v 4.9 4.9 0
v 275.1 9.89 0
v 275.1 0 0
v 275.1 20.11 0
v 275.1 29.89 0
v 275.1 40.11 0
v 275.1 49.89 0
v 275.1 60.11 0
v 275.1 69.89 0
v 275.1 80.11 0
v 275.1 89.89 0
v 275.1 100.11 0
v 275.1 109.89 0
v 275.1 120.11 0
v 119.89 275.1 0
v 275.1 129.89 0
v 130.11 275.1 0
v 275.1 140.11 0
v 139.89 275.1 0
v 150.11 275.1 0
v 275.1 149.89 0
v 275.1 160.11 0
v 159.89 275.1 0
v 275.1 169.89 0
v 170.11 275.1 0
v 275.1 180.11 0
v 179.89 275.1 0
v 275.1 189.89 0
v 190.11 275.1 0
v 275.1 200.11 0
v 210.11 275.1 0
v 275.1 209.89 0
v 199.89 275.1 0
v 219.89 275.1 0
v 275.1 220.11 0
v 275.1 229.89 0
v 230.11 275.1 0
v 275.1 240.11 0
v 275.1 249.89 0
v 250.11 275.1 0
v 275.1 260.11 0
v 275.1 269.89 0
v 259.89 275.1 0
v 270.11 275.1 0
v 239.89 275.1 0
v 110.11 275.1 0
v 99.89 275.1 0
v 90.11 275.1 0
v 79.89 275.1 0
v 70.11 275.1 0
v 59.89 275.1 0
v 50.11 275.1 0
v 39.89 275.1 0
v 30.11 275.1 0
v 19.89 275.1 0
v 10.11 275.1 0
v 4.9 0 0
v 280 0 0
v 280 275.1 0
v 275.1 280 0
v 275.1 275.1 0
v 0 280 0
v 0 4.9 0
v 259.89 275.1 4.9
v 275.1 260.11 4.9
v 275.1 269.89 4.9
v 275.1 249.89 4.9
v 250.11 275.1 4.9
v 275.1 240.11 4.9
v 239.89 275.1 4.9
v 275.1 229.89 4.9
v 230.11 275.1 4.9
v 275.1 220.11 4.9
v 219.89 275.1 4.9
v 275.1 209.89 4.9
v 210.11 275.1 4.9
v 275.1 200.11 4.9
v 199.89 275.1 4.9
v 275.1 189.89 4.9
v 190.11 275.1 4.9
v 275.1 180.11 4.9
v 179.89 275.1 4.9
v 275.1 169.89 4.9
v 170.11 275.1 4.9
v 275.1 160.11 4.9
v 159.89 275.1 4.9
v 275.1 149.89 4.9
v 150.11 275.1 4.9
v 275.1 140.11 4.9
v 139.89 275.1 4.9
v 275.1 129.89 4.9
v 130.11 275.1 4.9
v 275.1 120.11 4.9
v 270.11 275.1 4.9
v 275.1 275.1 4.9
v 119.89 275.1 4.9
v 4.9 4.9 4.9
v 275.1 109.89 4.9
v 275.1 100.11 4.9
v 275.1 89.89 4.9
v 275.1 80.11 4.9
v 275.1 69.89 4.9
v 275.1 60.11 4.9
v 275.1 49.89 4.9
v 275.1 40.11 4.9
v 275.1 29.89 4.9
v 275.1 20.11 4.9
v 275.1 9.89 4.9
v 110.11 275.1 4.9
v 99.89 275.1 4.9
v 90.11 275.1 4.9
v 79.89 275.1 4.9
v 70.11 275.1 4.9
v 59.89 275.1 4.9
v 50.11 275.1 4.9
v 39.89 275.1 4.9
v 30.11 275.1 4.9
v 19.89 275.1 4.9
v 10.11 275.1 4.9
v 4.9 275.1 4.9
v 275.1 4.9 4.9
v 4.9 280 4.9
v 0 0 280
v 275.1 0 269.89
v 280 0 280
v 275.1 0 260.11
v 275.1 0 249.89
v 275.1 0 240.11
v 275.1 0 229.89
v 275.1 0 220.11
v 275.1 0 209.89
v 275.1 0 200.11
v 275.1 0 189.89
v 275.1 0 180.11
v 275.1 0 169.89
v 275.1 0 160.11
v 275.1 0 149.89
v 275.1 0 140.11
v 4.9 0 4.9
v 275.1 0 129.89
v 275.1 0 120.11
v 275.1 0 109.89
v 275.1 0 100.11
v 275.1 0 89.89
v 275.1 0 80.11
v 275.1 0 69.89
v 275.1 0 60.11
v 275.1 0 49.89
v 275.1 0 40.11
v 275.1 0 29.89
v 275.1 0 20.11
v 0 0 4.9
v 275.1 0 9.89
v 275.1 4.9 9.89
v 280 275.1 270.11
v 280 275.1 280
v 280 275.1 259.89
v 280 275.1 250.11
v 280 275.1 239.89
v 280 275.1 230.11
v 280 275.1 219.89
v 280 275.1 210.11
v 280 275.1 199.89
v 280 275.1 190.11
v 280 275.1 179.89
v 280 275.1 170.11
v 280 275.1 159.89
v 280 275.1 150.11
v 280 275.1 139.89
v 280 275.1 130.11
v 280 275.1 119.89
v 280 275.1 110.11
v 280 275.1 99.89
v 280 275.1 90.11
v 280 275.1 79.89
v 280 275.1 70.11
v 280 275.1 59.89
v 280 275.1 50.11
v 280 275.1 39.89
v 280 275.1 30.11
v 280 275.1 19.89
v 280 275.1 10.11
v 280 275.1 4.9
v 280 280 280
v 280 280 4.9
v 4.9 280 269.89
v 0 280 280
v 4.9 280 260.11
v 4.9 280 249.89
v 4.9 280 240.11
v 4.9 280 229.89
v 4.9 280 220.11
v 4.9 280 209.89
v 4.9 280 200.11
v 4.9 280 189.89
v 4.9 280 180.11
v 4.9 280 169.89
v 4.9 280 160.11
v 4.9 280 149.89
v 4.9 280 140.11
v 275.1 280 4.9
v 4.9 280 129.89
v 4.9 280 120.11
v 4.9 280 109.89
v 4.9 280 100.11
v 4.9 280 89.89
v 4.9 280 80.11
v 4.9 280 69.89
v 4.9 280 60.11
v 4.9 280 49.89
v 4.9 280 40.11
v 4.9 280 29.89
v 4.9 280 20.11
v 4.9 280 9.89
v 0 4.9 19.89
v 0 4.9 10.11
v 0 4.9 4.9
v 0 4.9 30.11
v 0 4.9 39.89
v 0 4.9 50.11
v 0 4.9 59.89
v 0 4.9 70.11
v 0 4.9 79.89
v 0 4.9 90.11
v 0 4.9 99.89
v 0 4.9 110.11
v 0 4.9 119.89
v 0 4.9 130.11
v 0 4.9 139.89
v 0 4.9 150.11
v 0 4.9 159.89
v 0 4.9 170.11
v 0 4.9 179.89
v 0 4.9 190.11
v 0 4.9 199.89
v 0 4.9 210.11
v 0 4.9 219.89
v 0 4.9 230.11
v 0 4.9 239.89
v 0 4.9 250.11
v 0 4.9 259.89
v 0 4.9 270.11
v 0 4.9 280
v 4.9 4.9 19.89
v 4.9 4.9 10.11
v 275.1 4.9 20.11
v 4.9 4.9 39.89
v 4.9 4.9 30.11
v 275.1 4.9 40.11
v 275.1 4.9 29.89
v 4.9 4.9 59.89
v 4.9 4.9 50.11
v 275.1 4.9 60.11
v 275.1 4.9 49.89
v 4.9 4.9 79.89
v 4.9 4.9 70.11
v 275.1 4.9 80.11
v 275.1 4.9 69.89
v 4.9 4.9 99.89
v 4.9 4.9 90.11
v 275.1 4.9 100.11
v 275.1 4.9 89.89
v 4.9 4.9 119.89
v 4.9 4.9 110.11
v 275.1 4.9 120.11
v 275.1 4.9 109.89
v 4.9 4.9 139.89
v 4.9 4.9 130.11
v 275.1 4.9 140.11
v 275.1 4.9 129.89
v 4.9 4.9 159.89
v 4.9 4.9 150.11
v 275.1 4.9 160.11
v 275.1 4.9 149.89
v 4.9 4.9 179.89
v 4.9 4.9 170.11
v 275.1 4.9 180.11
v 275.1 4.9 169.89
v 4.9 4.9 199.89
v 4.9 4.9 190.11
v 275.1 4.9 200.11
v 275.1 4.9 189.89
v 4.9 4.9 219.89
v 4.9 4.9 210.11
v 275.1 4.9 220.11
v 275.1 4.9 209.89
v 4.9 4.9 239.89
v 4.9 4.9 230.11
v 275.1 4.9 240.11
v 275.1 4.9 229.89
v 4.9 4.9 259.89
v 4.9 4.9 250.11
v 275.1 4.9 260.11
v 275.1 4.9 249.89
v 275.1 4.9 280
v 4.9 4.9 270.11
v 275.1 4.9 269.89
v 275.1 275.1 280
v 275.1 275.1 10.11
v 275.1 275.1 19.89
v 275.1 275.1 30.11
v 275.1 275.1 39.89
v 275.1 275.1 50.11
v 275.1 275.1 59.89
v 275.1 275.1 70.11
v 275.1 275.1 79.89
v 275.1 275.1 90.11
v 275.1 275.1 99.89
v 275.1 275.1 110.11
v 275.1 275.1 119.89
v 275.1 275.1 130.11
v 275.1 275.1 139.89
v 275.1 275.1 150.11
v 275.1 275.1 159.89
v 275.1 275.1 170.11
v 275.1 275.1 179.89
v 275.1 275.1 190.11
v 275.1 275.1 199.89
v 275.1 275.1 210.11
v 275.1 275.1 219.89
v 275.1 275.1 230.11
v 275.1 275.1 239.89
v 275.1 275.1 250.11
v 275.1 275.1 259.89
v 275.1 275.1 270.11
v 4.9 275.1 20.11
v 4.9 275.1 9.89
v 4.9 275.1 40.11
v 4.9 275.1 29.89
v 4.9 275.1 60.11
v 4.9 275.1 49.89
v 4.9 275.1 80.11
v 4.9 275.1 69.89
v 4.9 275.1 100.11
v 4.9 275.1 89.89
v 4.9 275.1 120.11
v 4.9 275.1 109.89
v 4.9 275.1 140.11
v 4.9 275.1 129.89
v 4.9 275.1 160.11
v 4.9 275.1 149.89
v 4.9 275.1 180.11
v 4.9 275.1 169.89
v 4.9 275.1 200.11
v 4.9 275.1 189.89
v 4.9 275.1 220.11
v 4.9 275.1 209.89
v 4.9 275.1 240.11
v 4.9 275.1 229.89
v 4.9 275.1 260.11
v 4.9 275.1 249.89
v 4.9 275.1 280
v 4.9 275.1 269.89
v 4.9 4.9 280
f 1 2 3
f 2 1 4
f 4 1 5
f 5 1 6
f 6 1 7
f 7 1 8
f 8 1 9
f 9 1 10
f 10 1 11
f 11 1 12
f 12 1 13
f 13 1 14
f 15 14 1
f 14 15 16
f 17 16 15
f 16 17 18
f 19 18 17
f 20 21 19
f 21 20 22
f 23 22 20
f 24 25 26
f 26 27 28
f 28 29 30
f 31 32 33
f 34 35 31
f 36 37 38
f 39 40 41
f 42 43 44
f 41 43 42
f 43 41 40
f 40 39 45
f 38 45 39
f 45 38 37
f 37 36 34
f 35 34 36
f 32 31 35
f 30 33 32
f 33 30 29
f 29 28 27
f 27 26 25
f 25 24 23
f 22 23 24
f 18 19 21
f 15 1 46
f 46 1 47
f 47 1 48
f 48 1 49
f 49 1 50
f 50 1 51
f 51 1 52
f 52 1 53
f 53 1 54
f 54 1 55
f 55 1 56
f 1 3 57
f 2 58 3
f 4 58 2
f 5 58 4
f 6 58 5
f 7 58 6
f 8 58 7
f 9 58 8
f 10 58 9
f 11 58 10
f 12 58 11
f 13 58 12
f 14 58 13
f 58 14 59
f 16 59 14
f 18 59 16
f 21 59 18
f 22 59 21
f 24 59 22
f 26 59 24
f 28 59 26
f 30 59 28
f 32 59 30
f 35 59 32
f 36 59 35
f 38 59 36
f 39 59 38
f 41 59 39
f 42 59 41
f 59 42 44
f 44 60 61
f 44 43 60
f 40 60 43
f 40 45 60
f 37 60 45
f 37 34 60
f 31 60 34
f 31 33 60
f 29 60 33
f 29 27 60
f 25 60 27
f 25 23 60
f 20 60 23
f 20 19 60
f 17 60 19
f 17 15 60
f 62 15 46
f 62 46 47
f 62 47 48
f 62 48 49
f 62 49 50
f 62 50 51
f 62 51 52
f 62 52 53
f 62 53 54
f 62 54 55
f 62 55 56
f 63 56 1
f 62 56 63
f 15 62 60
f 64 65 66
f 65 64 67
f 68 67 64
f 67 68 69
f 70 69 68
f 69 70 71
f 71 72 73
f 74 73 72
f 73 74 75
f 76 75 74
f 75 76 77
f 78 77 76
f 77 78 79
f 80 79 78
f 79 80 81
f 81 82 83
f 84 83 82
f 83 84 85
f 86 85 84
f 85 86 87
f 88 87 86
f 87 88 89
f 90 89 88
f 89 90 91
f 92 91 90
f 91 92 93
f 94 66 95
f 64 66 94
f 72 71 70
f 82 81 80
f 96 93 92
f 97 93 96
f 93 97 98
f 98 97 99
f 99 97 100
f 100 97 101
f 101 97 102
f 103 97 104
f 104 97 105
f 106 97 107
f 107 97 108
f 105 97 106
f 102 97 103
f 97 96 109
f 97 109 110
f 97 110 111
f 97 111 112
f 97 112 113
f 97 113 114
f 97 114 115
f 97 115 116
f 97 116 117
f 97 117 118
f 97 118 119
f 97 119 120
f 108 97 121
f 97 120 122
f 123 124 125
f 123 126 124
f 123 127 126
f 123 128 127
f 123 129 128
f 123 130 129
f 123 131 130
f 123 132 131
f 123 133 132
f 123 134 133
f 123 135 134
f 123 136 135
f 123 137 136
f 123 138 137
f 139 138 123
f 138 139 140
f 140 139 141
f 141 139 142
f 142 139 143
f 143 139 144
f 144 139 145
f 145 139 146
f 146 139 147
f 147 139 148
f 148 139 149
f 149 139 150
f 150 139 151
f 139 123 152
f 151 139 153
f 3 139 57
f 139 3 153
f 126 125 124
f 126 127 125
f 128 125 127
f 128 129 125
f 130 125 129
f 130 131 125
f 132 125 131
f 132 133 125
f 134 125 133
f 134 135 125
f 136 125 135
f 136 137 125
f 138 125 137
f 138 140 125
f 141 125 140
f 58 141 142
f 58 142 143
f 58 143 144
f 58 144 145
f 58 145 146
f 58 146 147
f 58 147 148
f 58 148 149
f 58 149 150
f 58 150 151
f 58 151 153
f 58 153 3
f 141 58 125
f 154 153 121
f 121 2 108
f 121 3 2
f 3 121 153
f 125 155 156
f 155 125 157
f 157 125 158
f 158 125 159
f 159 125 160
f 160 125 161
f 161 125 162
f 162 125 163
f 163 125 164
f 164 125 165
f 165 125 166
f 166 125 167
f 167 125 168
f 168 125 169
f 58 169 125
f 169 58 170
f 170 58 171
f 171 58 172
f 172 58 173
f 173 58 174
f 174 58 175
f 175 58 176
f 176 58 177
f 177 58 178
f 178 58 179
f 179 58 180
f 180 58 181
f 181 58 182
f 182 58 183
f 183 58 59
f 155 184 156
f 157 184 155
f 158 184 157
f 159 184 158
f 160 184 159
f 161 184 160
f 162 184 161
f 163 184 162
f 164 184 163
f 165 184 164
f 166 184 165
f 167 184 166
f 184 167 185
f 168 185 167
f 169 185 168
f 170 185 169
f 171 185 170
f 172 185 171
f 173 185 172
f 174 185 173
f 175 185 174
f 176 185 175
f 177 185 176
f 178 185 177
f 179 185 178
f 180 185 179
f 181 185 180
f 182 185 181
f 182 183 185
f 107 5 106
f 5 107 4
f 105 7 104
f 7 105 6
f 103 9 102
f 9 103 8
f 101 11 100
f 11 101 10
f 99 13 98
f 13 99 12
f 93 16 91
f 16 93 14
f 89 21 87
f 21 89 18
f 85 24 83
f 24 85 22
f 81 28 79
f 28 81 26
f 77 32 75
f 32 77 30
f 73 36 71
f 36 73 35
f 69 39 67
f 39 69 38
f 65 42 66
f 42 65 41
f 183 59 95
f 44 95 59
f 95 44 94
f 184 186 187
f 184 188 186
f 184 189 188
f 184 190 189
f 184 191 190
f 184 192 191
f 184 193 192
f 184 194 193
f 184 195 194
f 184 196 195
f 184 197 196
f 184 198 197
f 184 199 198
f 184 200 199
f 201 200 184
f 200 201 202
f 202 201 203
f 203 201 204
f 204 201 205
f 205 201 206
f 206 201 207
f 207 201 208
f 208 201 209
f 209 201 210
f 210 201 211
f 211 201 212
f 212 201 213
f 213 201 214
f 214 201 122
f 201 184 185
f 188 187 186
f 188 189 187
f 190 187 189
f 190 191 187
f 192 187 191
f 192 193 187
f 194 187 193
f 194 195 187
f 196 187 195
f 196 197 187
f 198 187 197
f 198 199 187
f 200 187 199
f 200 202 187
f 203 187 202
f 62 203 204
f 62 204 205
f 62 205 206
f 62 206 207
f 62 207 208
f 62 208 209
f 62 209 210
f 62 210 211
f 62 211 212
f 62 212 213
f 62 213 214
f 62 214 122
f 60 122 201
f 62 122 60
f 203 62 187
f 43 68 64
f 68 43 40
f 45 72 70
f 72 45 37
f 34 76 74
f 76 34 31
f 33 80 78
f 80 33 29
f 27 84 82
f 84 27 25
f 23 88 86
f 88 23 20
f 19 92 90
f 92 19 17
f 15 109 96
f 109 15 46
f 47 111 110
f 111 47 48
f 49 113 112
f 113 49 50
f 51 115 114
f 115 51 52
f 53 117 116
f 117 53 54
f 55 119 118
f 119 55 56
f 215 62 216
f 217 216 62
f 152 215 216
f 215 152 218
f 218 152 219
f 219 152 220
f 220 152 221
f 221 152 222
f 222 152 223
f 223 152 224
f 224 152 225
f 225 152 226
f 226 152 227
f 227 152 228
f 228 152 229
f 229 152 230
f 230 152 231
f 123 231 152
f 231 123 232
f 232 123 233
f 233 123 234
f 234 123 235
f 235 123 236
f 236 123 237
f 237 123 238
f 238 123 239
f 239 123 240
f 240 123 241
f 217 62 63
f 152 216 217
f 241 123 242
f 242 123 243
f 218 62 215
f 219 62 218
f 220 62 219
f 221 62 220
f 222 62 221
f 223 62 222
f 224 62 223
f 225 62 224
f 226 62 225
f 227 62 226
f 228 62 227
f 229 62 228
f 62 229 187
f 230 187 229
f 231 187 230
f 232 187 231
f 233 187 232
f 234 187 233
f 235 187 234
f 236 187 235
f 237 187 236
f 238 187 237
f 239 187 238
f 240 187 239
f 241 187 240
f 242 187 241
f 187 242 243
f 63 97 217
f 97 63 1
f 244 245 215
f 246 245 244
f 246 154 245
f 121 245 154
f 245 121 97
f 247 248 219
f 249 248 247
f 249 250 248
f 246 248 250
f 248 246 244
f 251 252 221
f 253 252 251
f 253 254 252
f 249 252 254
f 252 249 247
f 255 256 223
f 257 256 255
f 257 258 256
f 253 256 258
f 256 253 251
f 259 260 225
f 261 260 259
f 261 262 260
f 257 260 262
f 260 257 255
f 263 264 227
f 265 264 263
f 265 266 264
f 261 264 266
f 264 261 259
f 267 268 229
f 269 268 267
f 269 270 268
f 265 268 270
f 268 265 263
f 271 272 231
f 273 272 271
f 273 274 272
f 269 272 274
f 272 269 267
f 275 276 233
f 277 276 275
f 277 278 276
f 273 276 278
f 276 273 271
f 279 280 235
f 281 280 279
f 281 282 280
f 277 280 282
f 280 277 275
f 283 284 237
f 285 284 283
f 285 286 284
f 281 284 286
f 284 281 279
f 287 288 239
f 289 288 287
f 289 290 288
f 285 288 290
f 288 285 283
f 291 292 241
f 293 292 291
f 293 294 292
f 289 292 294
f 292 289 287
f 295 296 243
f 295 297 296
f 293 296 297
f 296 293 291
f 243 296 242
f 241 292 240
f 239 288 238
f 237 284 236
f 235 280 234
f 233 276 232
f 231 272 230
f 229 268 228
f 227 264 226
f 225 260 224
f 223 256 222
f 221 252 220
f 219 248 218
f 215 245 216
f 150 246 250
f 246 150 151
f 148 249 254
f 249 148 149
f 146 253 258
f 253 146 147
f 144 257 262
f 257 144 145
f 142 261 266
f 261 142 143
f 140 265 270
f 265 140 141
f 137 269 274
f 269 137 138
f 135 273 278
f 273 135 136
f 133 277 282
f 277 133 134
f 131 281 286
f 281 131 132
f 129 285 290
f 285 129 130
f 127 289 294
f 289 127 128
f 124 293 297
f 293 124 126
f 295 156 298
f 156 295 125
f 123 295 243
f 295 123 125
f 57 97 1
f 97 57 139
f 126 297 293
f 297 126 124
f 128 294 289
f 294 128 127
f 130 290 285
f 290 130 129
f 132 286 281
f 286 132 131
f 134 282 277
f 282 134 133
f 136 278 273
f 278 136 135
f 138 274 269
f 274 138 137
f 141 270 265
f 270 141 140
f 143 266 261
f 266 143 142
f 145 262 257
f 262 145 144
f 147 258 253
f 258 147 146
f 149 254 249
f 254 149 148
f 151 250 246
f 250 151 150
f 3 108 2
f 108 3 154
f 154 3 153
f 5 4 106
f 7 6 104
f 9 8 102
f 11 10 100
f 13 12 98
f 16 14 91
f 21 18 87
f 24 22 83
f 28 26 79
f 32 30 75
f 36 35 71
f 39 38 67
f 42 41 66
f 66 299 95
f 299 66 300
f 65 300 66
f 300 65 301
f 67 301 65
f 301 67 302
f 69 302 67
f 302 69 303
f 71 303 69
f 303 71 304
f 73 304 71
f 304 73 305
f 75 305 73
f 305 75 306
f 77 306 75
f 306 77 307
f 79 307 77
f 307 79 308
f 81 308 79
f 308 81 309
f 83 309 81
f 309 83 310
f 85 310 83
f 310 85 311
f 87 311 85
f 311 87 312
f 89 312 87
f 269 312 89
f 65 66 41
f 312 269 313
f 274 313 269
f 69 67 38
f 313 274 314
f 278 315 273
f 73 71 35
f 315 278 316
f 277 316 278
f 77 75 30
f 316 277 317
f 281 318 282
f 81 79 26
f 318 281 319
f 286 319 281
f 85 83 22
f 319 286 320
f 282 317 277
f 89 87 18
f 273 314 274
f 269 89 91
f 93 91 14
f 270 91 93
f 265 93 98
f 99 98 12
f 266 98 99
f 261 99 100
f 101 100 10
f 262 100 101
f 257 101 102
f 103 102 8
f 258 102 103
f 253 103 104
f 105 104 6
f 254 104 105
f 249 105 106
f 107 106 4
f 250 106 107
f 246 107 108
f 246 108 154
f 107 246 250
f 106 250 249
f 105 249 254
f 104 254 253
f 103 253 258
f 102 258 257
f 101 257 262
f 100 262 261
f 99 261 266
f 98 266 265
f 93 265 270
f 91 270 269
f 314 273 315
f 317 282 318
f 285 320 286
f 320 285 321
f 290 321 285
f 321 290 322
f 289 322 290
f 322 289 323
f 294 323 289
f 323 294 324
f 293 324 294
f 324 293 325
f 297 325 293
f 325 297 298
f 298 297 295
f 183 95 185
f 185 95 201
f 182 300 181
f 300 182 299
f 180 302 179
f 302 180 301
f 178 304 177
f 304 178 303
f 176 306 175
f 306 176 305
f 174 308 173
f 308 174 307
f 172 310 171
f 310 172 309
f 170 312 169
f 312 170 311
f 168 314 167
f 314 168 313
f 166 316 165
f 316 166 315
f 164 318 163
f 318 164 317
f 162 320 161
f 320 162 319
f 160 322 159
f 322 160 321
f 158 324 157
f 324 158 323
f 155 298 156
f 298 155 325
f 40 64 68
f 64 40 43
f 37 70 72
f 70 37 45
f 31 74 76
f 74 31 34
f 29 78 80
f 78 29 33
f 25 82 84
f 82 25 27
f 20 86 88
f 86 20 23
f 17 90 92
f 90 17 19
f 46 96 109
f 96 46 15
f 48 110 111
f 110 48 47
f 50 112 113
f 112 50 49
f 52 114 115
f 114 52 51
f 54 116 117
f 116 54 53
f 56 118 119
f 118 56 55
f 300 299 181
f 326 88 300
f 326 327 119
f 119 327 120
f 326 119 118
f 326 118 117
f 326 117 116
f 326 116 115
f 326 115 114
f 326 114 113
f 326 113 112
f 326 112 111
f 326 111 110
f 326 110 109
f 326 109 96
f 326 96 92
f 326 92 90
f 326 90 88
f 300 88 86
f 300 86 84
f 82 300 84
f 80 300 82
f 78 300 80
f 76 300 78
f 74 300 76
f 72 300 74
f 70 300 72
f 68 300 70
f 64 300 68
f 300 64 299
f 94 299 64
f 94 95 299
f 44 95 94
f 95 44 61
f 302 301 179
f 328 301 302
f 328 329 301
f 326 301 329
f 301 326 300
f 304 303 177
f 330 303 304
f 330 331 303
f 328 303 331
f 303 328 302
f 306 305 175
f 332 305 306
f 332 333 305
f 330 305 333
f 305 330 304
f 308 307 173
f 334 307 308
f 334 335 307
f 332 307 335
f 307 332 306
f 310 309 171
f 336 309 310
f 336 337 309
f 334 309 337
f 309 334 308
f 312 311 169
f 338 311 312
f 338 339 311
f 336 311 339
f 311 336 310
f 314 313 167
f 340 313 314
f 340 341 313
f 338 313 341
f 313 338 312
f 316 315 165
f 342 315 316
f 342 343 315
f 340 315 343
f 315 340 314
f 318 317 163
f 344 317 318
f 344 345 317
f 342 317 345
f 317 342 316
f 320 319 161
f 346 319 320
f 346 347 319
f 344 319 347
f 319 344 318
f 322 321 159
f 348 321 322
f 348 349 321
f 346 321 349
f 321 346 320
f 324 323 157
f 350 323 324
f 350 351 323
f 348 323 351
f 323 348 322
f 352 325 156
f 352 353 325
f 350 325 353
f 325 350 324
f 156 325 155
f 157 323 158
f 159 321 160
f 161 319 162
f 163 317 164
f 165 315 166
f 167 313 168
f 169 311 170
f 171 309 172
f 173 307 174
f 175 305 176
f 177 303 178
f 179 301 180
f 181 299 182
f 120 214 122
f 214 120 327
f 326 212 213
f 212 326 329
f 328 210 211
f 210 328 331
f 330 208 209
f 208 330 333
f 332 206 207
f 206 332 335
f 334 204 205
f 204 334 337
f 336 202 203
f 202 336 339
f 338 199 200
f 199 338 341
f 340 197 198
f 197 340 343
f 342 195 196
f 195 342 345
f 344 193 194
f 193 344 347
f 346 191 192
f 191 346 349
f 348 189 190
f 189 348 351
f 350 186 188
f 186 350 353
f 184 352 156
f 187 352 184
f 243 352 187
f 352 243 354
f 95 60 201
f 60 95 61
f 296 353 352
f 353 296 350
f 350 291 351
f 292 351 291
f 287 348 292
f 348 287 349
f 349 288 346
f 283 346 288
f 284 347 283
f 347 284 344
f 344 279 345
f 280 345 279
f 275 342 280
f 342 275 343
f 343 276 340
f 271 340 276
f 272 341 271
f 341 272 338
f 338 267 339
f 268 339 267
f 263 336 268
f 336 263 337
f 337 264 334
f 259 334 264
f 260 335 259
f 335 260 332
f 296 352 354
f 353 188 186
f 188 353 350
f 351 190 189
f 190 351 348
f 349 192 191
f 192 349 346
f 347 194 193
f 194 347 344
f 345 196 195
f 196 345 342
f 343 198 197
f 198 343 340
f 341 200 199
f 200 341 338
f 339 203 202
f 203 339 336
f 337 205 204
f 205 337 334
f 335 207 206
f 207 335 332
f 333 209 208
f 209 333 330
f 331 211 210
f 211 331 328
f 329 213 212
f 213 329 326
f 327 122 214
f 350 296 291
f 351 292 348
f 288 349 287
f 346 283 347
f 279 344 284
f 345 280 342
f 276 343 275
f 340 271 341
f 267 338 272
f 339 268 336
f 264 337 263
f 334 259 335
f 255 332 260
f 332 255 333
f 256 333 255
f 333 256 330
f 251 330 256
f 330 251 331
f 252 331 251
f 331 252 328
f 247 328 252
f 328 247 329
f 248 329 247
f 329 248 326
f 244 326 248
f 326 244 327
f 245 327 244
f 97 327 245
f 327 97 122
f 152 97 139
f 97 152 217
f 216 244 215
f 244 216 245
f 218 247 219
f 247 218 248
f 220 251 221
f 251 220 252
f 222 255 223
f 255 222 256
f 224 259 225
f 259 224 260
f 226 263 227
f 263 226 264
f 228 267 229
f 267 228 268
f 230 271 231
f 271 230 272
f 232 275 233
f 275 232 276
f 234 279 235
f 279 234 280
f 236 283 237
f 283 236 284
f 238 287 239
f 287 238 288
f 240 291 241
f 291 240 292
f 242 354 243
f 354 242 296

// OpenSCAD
union() {
	union() {
		linear_extrude(height = 4.9000000000) {
			union() {
				difference() {
					polygon(points = [[275.1000000000, 269.8900000000], [275.1000000000, 260.1100000000], [280.0000000000, 260.1100000000], [280.0000000000, 249.8900000000], [275.1000000000, 249.8900000000], [275.1000000000, 240.1100000000], [280.0000000000, 240.1100000000], [280.0000000000, 229.8900000000], [275.1000000000, 229.8900000000], [275.1000000000, 220.1100000000], [280.0000000000, 220.1100000000], [280.0000000000, 209.8900000000], [275.1000000000, 209.8900000000], [275.1000000000, 200.1100000000], [280.0000000000, 200.1100000000], [280.0000000000, 189.8900000000], [275.1000000000, 189.8900000000], [275.1000000000, 180.1100000000], [280.0000000000, 180.1100000000], [280.0000000000, 169.8900000000], [275.1000000000, 169.8900000000], [275.1000000000, 160.1100000000], [280.0000000000, 160.1100000000], [280.0000000000, 149.8900000000], [275.1000000000, 149.8900000000], [275.1000000000, 140.1100000000], [280.0000000000, 140.1100000000], [280.0000000000, 129.8900000000], [275.1000000000, 129.8900000000], [275.1000000000, 120.1100000000], [280.0000000000, 120.1100000000], [280.0000000000, 109.8900000000], [275.1000000000, 109.8900000000], [275.1000000000, 100.1100000000], [280.0000000000, 100.1100000000], [280.0000000000, 89.8900000000], [275.1000000000, 89.8900000000], [275.1000000000, 80.1100000000], [280.0000000000, 80.1100000000], [280.0000000000, 69.8900000000], [275.1000000000, 69.8900000000], [275.1000000000, 60.1100000000], [280.0000000000, 60.1100000000], [280.0000000000, 49.8900000000], [275.1000000000, 49.8900000000], [275.1000000000, 40.1100000000], [280.0000000000, 40.1100000000], [280.0000000000, 29.8900000000], [275.1000000000, 29.8900000000], [275.1000000000, 20.1100000000], [280.0000000000, 20.1100000000], [280.0000000000, 9.8900000000], [275.1000000000, 9.8900000000], [275.1000000000, 0.0000000000], [269.8900000000, 0.0000000000], [269.8900000000, 4.9000000000], [260.1100000000, 4.9000000000], [260.1100000000, 0.0000000000], [249.8900000000, 0.0000000000], [249.8900000000, 4.9000000000], [240.1100000000, 4.9000000000], [240.1100000000, 0.0000000000], [229.8900000000, 0.0000000000], [229.8900000000, 4.9000000000], [220.1100000000, 4.9000000000], [220.1100000000, 0.0000000000], [209.8900000000, 0.0000000000], [209.8900000000, 4.9000000000], [200.1100000000, 4.9000000000], [200.1100000000, 0.0000000000], [189.8900000000, 0.0000000000], [189.8900000000, 4.9000000000], [180.1100000000, 4.9000000000], [180.1100000000, 0.0000000000], [169.8900000000, 0.0000000000], [169.8900000000, 4.9000000000], [160.1100000000, 4.9000000000], [160.1100000000, 0.0000000000], [149.8900000000, 0.0000000000], [149.8900000000, 4.9000000000], [140.1100000000, 4.9000000000], [140.1100000000, 0.0000000000], [129.8900000000, 0.0000000000], [129.8900000000, 4.9000000000], [120.1100000000, 4.9000000000], [120.1100000000, 0.0000000000], [109.8900000000, 0.0000000000], [109.8900000000, 4.9000000000], [100.1100000000, 4.9000000000], [100.1100000000, 0.0000000000], [89.8900000000, 0.0000000000], [89.8900000000, 4.9000000000], [80.1100000000, 4.9000000000], [80.1100000000, 0.0000000000], [69.8900000000, 0.0000000000], [69.8900000000, 4.9000000000], [60.1100000000, 4.9000000000], [60.1100000000, 0.0000000000], [49.8900000000, 0.0000000000], [49.8900000000, 4.9000000000], [40.1100000000, 4.9000000000], [40.1100000000, 0.0000000000], [29.8900000000, 0.0000000000], [29.8900000000, 4.9000000000], [20.1100000000, 4.9000000000], [20.1100000000, 0.0000000000], [9.8900000000, 0.0000000000], [9.8900000000, 4.9000000000], [0.0000000000, 4.9000000000], [0.0000000000, 10.1100000000], [4.9000000000, 10.1100000000], [4.9000000000, 19.8900000000], [0.0000000000, 19.8900000000], [0.0000000000, 30.1100000000], [4.9000000000, 30.1100000000], [4.9000000000, 39.8900000000], [0.0000000000, 39.8900000000], [0.0000000000, 50.1100000000], [4.9000000000, 50.1100000000], [4.9000000000, 59.8900000000], [0.0000000000, 59.8900000000], [0.0000000000, 70.1100000000], [4.9000000000, 70.1100000000], [4.9000000000, 79.8900000000], [0.0000000000, 79.8900000000], [0.0000000000, 90.1100000000], [4.9000000000, 90.1100000000], [4.9000000000, 99.8900000000], [0.0000000000, 99.8900000000], [0.0000000000, 110.1100000000], [4.9000000000, 110.1100000000], [4.9000000000, 119.8900000000], [0.0000000000, 119.8900000000], [0.0000000000, 130.1100000000], [4.9000000000, 130.1100000000], [4.9000000000, 139.8900000000], [0.0000000000, 139.8900000000], [0.0000000000, 150.1100000000], [4.9000000000, 150.1100000000], [4.9000000000, 159.8900000000], [0.0000000000, 159.8900000000], [0.0000000000, 170.1100000000], [4.9000000000, 170.1100000000], [4.9000000000, 179.8900000000], [0.0000000000, 179.8900000000], [0.0000000000, 190.1100000000], [4.9000000000, 190.1100000000], [4.9000000000, 199.8900000000], [0.0000000000, 199.8900000000], [0.0000000000, 210.1100000000], [4.9000000000, 210.1100000000], [4.9000000000, 219.8900000000], [0.0000000000, 219.8900000000], [0.0000000000, 230.1100000000], [4.9000000000, 230.1100000000], [4.9000000000, 239.8900000000], [0.0000000000, 239.8900000000], [0.0000000000, 250.1100000000], [4.9000000000, 250.1100000000], [4.9000000000, 259.8900000000], [0.0000000000, 259.8900000000], [0.0000000000, 270.1100000000], [4.9000000000, 270.1100000000], [4.9000000000, 280.0000000000], [10.1100000000, 280.0000000000], [10.1100000000, 275.1000000000], [19.8900000000, 275.1000000000], [19.8900000000, 280.0000000000], [30.1100000000, 280.0000000000], [30.1100000000, 275.1000000000], [39.8900000000, 275.1000000000], [39.8900000000, 280.0000000000], [50.1100000000, 280.0000000000], [50.1100000000, 275.1000000000], [59.8900000000, 275.1000000000], [59.8900000000, 280.0000000000], [70.1100000000, 280.0000000000], [70.1100000000, 275.1000000000], [79.8900000000, 275.1000000000], [79.8900000000, 280.0000000000], [90.1100000000, 280.0000000000], [90.1100000000, 275.1000000000], [99.8900000000, 275.1000000000], [99.8900000000, 280.0000000000], [110.1100000000, 280.0000000000], [110.1100000000, 275.1000000000], [119.8900000000, 275.1000000000], [119.8900000000, 280.0000000000], [130.1100000000, 280.0000000000], [130.1100000000, 275.1000000000], [139.8900000000, 275.1000000000], [139.8900000000, 280.0000000000], [150.1100000000, 280.0000000000], [150.1100000000, 275.1000000000], [159.8900000000, 275.1000000000], [159.8900000000, 280.0000000000], [170.1100000000, 280.0000000000], [170.1100000000, 275.1000000000], [179.8900000000, 275.1000000000], [179.8900000000, 280.0000000000], [190.1100000000, 280.0000000000], [190.1100000000, 275.1000000000], [199.8900000000, 275.1000000000], [199.8900000000, 280.0000000000], [210.1100000000, 280.0000000000], [210.1100000000, 275.1000000000], [219.8900000000, 275.1000000000], [219.8900000000, 280.0000000000], [230.1100000000, 280.0000000000], [230.1100000000, 275.1000000000], [239.8900000000, 275.1000000000], [239.8900000000, 280.0000000000], [250.1100000000, 280.0000000000], [250.1100000000, 275.1000000000], [259.8900000000, 275.1000000000], [259.8900000000, 280.0000000000], [270.1100000000, 280.0000000000], [270.1100000000, 275.1000000000], [280.0000000000, 275.1000000000], [280.0000000000, 269.8900000000], [275.1000000000, 269.8900000000]]);
				}
			}
		}
	}
	union() {
		color(alpha = 1.0000000000, c = [0.8000000000, 0.5000000000, 0.2000000000]) {
			translate(v = [0, 4.9000000000, 0]) {
				rotate(a = 90, v = [1, 0, 0]) {
					linear_extrude(height = 4.9000000000) {
						union() {
							difference() {
								polygon(points = [[280.0000000000, 280.0000000000], [280.0000000000, 269.8900000000], [275.1000000000, 269.8900000000], [275.1000000000, 260.1100000000], [280.0000000000, 260.1100000000], [280.0000000000, 249.8900000000], [275.1000000000, 249.8900000000], [275.1000000000, 240.1100000000], [280.0000000000, 240.1100000000], [280.0000000000, 229.8900000000], [275.1000000000, 229.8900000000], [275.1000000000, 220.1100000000], [280.0000000000, 220.1100000000], [280.0000000000, 209.8900000000], [275.1000000000, 209.8900000000], [275.1000000000, 200.1100000000], [280.0000000000, 200.1100000000], [280.0000000000, 189.8900000000], [275.1000000000, 189.8900000000], [275.1000000000, 180.1100000000], [280.0000000000, 180.1100000000], [280.0000000000, 169.8900000000], [275.1000000000, 169.8900000000], [275.1000000000, 160.1100000000], [280.0000000000, 160.1100000000], [280.0000000000, 149.8900000000], [275.1000000000, 149.8900000000], [275.1000000000, 140.1100000000], [280.0000000000, 140.1100000000], [280.0000000000, 129.8900000000], [275.1000000000, 129.8900000000], [275.1000000000, 120.1100000000], [280.0000000000, 120.1100000000], [280.0000000000, 109.8900000000], [275.1000000000, 109.8900000000], [275.1000000000, 100.1100000000], [280.0000000000, 100.1100000000], [280.0000000000, 89.8900000000], [275.1000000000, 89.8900000000], [275.1000000000, 80.1100000000], [280.0000000000, 80.1100000000], [280.0000000000, 69.8900000000], [275.1000000000, 69.8900000000], [275.1000000000, 60.1100000000], [280.0000000000, 60.1100000000], [280.0000000000, 49.8900000000], [275.1000000000, 49.8900000000], [275.1000000000, 40.1100000000], [280.0000000000, 40.1100000000], [280.0000000000, 29.8900000000], [275.1000000000, 29.8900000000], [275.1000000000, 20.1100000000], [280.0000000000, 20.1100000000], [280.0000000000, 9.8900000000], [275.1000000000, 9.8900000000], [275.1000000000, 4.9000000000], [270.1100000000, 4.9000000000], [270.1100000000, 0.0000000000], [259.8900000000, 0.0000000000], [259.8900000000, 4.9000000000], [250.1100000000, 4.9000000000], [250.1100000000, 0.0000000000], [239.8900000000, 0.0000000000], [239.8900000000, 4.9000000000], [230.1100000000, 4.9000000000], [230.1100000000, 0.0000000000], [219.8900000000, 0.0000000000], [219.8900000000, 4.9000000000], [210.1100000000, 4.9000000000], [210.1100000000, 0.0000000000], [199.8900000000, 0.0000000000], [199.8900000000, 4.9000000000], [190.1100000000, 4.9000000000], [190.1100000000, 0.0000000000], [179.8900000000, 0.0000000000], [179.8900000000, 4.9000000000], [170.1100000000, 4.9000000000], [170.1100000000, 0.0000000000], [159.8900000000, 0.0000000000], [159.8900000000, 4.9000000000], [150.1100000000, 4.9000000000], [150.1100000000, 0.0000000000], [139.8900000000, 0.0000000000], [139.8900000000, 4.9000000000], [130.1100000000, 4.9000000000], [130.1100000000, 0.0000000000], [119.8900000000, 0.0000000000], [119.8900000000, 4.9000000000], [110.1100000000, 4.9000000000], [110.1100000000, 0.0000000000], [99.8900000000, 0.0000000000], [99.8900000000, 4.9000000000], [90.1100000000, 4.9000000000], [90.1100000000, 0.0000000000], [79.8900000000, 0.0000000000], [79.8900000000, 4.9000000000], [70.1100000000, 4.9000000000], [70.1100000000, 0.0000000000], [59.8900000000, 0.0000000000], [59.8900000000, 4.9000000000], [50.1100000000, 4.9000000000], [50.1100000000, 0.0000000000], [39.8900000000, 0.0000000000], [39.8900000000, 4.9000000000], [30.1100000000, 4.9000000000], [30.1100000000, 0.0000000000], [19.8900000000, 0.0000000000], [19.8900000000, 4.9000000000], [10.1100000000, 4.9000000000], [10.1100000000, 0.0000000000], [4.9000000000, 0.0000000000], [4.9000000000, 9.8900000000], [0.0000000000, 9.8900000000], [0.0000000000, 20.1100000000], [4.9000000000, 20.1100000000], [4.9000000000, 29.8900000000], [0.0000000000, 29.8900000000], [0.0000000000, 40.1100000000], [4.9000000000, 40.1100000000], [4.9000000000, 49.8900000000], [0.0000000000, 49.8900000000], [0.0000000000, 60.1100000000], [4.9000000000, 60.1100000000], [4.9000000000, 69.8900000000], [0.0000000000, 69.8900000000], [0.0000000000, 80.1100000000], [4.9000000000, 80.1100000000], [4.9000000000, 89.8900000000], [0.0000000000, 89.8900000000], [0.0000000000, 100.1100000000], [4.9000000000, 100.1100000000], [4.9000000000, 109.8900000000], [0.0000000000, 109.8900000000], [0.0000000000, 120.1100000000], [4.9000000000, 120.1100000000], [4.9000000000, 129.8900000000], [0.0000000000, 129.8900000000], [0.0000000000, 140.1100000000], [4.9000000000, 140.1100000000], [4.9000000000, 149.8900000000], [0.0000000000, 149.8900000000], [0.0000000000, 160.1100000000], [4.9000000000, 160.1100000000], [4.9000000000, 169.8900000000], [0.0000000000, 169.8900000000], [0.0000000000, 180.1100000000], [4.9000000000, 180.1100000000], [4.9000000000, 189.8900000000], [0.0000000000, 189.8900000000], [0.0000000000, 200.1100000000], [4.9000000000, 200.1100000000], [4.9000000000, 209.8900000000], [0.0000000000, 209.8900000000], [0.0000000000, 220.1100000000], [4.9000000000, 220.1100000000], [4.9000000000, 229.8900000000], [0.0000000000, 229.8900000000], [0.0000000000, 240.1100000000], [4.9000000000, 240.1100000000], [4.9000000000, 249.8900000000], [0.0000000000, 249.8900000000], [0.0000000000, 260.1100000000], [4.9000000000, 260.1100000000], [4.9000000000, 269.8900000000], [0.0000000000, 269.8900000000], [0.0000000000, 280.0000000000], [280.0000000000, 280.0000000000]]);
							}
						}
					}
				}
			}
		}
	}
	union() {
		color(alpha = 1.0000000000, c = [0.7000000000, 0.4000000000, 0.1000000000]) {
			translate(v = [275.1000000000, 0, 0]) {
				rotate(a = 90, v = [0, 0, 1]) {
					rotate(a = 90, v = [1, 0, 0]) {
						linear_extrude(height = 4.9000000000) {
							union() {
								difference() {
									polygon(points = [[275.1000000000, 280.0000000000], [275.1000000000, 270.1100000000], [280.0000000000, 270.1100000000], [280.0000000000, 259.8900000000], [275.1000000000, 259.8900000000], [275.1000000000, 250.1100000000], [280.0000000000, 250.1100000000], [280.0000000000, 239.8900000000], [275.1000000000, 239.8900000000], [275.1000000000, 230.1100000000], [280.0000000000, 230.1100000000], [280.0000000000, 219.8900000000], [275.1000000000, 219.8900000000], [275.1000000000, 210.1100000000], [280.0000000000, 210.1100000000], [280.0000000000, 199.8900000000], [275.1000000000, 199.8900000000], [275.1000000000, 190.1100000000], [280.0000000000, 190.1100000000], [280.0000000000, 179.8900000000], [275.1000000000, 179.8900000000], [275.1000000000, 170.1100000000], [280.0000000000, 170.1100000000], [280.0000000000, 159.8900000000], [275.1000000000, 159.8900000000], [275.1000000000, 150.1100000000], [280.0000000000, 150.1100000000], [280.0000000000, 139.8900000000], [275.1000000000, 139.8900000000], [275.1000000000, 130.1100000000], [280.0000000000, 130.1100000000], [280.0000000000, 119.8900000000], [275.1000000000, 119.8900000000], [275.1000000000, 110.1100000000], [280.0000000000, 110.1100000000], [280.0000000000, 99.8900000000], [275.1000000000, 99.8900000000], [275.1000000000, 90.1100000000], [280.0000000000, 90.1100000000], [280.0000000000, 79.8900000000], [275.1000000000, 79.8900000000], [275.1000000000, 70.1100000000], [280.0000000000, 70.1100000000], [280.0000000000, 59.8900000000], [275.1000000000, 59.8900000000], [275.1000000000, 50.1100000000], [280.0000000000, 50.1100000000], [280.0000000000, 39.8900000000], [275.1000000000, 39.8900000000], [275.1000000000, 30.1100000000], [280.0000000000, 30.1100000000], [280.0000000000, 19.8900000000], [275.1000000000, 19.8900000000], [275.1000000000, 10.1100000000], [280.0000000000, 10.1100000000], [280.0000000000, 4.9000000000], [270.1100000000, 4.9000000000], [270.1100000000, 0.0000000000], [259.8900000000, 0.0000000000], [259.8900000000, 4.9000000000], [250.1100000000, 4.9000000000], [250.1100000000, 0.0000000000], [239.8900000000, 0.0000000000], [239.8900000000, 4.9000000000], [230.1100000000, 4.9000000000], [230.1100000000, 0.0000000000], [219.8900000000, 0.0000000000], [219.8900000000, 4.9000000000], [210.1100000000, 4.9000000000], [210.1100000000, 0.0000000000], [199.8900000000, 0.0000000000], [199.8900000000, 4.9000000000], [190.1100000000, 4.9000000000], [190.1100000000, 0.0000000000], [179.8900000000, 0.0000000000], [179.8900000000, 4.9000000000], [170.1100000000, 4.9000000000], [170.1100000000, 0.0000000000], [159.8900000000, 0.0000000000], [159.8900000000, 4.9000000000], [150.1100000000, 4.9000000000], [150.1100000000, 0.0000000000], [139.8900000000, 0.0000000000], [139.8900000000, 4.9000000000], [130.1100000000, 4.9000000000], [130.1100000000, 0.0000000000], [119.8900000000, 0.0000000000], [119.8900000000, 4.9000000000], [110.1100000000, 4.9000000000], [110.1100000000, 0.0000000000], [99.8900000000, 0.0000000000], [99.8900000000, 4.9000000000], [90.1100000000, 4.9000000000], [90.1100000000, 0.0000000000], [79.8900000000, 0.0000000000], [79.8900000000, 4.9000000000], [70.1100000000, 4.9000000000], [70.1100000000, 0.0000000000], [59.8900000000, 0.0000000000], [59.8900000000, 4.9000000000], [50.1100000000, 4.9000000000], [50.1100000000, 0.0000000000], [39.8900000000, 0.0000000000], [39.8900000000, 4.9000000000], [30.1100000000, 4.9000000000], [30.1100000000, 0.0000000000], [19.8900000000, 0.0000000000], [19.8900000000, 4.9000000000], [10.1100000000, 4.9000000000], [10.1100000000, 0.0000000000], [0.0000000000, 0.0000000000], [0.0000000000, 10.1100000000], [4.9000000000, 10.1100000000], [4.9000000000, 19.8900000000], [0.0000000000, 19.8900000000], [0.0000000000, 30.1100000000], [4.9000000000, 30.1100000000], [4.9000000000, 39.8900000000], [0.0000000000, 39.8900000000], [0.0000000000, 50.1100000000], [4.9000000000, 50.1100000000], [4.9000000000, 59.8900000000], [0.0000000000, 59.8900000000], [0.0000000000, 70.1100000000], [4.9000000000, 70.1100000000], [4.9000000000, 79.8900000000], [0.0000000000, 79.8900000000], [0.0000000000, 90.1100000000], [4.9000000000, 90.1100000000], [4.9000000000, 99.8900000000], [0.0000000000, 99.8900000000], [0.0000000000, 110.1100000000], [4.9000000000, 110.1100000000], [4.9000000000, 119.8900000000], [0.0000000000, 119.8900000000], [0.0000000000, 130.1100000000], [4.9000000000, 130.1100000000], [4.9000000000, 139.8900000000], [0.0000000000, 139.8900000000], [0.0000000000, 150.1100000000], [4.9000000000, 150.1100000000], [4.9000000000, 159.8900000000], [0.0000000000, 159.8900000000], [0.0000000000, 170.1100000000], [4.9000000000, 170.1100000000], [4.9000000000, 179.8900000000], [0.0000000000, 179.8900000000], [0.0000000000, 190.1100000000], [4.9000000000, 190.1100000000], [4.9000000000, 199.8900000000], [0.0000000000, 199.8900000000], [0.0000000000, 210.1100000000], [4.9000000000, 210.1100000000], [4.9000000000, 219.8900000000], [0.0000000000, 219.8900000000], [0.0000000000, 230.1100000000], [4.9000000000, 230.1100000000], [4.9000000000, 239.8900000000], [0.0000000000, 239.8900000000], [0.0000000000, 250.1100000000], [4.9000000000, 250.1100000000], [4.9000000000, 259.8900000000], [0.0000000000, 259.8900000000], [0.0000000000, 270.1100000000], [4.9000000000, 270.1100000000], [4.9000000000, 280.0000000000], [275.1000000000, 280.0000000000]]);
								}
							}
						}
					}
				}
			}
		}
	}
	union() {
		color(alpha = 1.0000000000, c = [0.8000000000, 0.5000000000, 0.2000000000]) {
			translate(v = [280, 275.1000000000, 0]) {
				rotate(a = 180, v = [0, 0, 1]) {
					rotate(a = 90, v = [1, 0, 0]) {
						linear_extrude(height = 4.9000000000) {
							union() {
								difference() {
									polygon(points = [[280.0000000000, 280.0000000000], [280.0000000000, 269.8900000000], [275.1000000000, 269.8900000000], [275.1000000000, 260.1100000000], [280.0000000000, 260.1100000000], [280.0000000000, 249.8900000000], [275.1000000000, 249.8900000000], [275.1000000000, 240.1100000000], [280.0000000000, 240.1100000000], [280.0000000000, 229.8900000000], [275.1000000000, 229.8900000000], [275.1000000000, 220.1100000000], [280.0000000000, 220.1100000000], [280.0000000000, 209.8900000000], [275.1000000000, 209.8900000000], [275.1000000000, 200.1100000000], [280.0000000000, 200.1100000000], [280.0000000000, 189.8900000000], [275.1000000000, 189.8900000000], [275.1000000000, 180.1100000000], [280.0000000000, 180.1100000000], [280.0000000000, 169.8900000000], [275.1000000000, 169.8900000000], [275.1000000000, 160.1100000000], [280.0000000000, 160.1100000000], [280.0000000000, 149.8900000000], [275.1000000000, 149.8900000000], [275.1000000000, 140.1100000000], [280.0000000000, 140.1100000000], [280.0000000000, 129.8900000000], [275.1000000000, 129.8900000000], [275.1000000000, 120.1100000000], [280.0000000000, 120.1100000000], [280.0000000000, 109.8900000000], [275.1000000000, 109.8900000000], [275.1000000000, 100.1100000000], [280.0000000000, 100.1100000000], [280.0000000000, 89.8900000000], [275.1000000000, 89.8900000000], [275.1000000000, 80.1100000000], [280.0000000000, 80.1100000000], [280.0000000000, 69.8900000000], [275.1000000000, 69.8900000000], [275.1000000000, 60.1100000000], [280.0000000000, 60.1100000000], [280.0000000000, 49.8900000000], [275.1000000000, 49.8900000000], [275.1000000000, 40.1100000000], [280.0000000000, 40.1100000000], [280.0000000000, 29.8900000000], [275.1000000000, 29.8900000000], [275.1000000000, 20.1100000000], [280.0000000000, 20.1100000000], [280.0000000000, 9.8900000000], [275.1000000000, 9.8900000000], [275.1000000000, 4.9000000000], [270.1100000000, 4.9000000000], [270.1100000000, 0.0000000000], [259.8900000000, 0.0000000000], [259.8900000000, 4.9000000000], [250.1100000000, 4.9000000000], [250.1100000000, 0.0000000000], [239.8900000000, 0.0000000000], [239.8900000000, 4.9000000000], [230.1100000000, 4.9000000000], [230.1100000000, 0.0000000000], [219.8900000000, 0.0000000000], [219.8900000000, 4.9000000000], [210.1100000000, 4.9000000000], [210.1100000000, 0.0000000000], [199.8900000000, 0.0000000000], [199.8900000000, 4.9000000000], [190.1100000000, 4.9000000000], [190.1100000000, 0.0000000000], [179.8900000000, 0.0000000000], [179.8900000000, 4.9000000000], [170.1100000000, 4.9000000000], [170.1100000000, 0.0000000000], [159.8900000000, 0.0000000000], [159.8900000000, 4.9000000000], [150.1100000000, 4.9000000000], [150.1100000000, 0.0000000000], [139.8900000000, 0.0000000000], [139.8900000000, 4.9000000000], [130.1100000000, 4.9000000000], [130.1100000000, 0.0000000000], [119.8900000000, 0.0000000000], [119.8900000000, 4.9000000000], [110.1100000000, 4.9000000000], [110.1100000000, 0.0000000000], [99.8900000000, 0.0000000000], [99.8900000000, 4.9000000000], [90.1100000000, 4.9000000000], [90.1100000000, 0.0000000000], [79.8900000000, 0.0000000000], [79.8900000000, 4.9000000000], [70.1100000000, 4.9000000000], [70.1100000000, 0.0000000000], [59.8900000000, 0.0000000000], [59.8900000000, 4.9000000000], [50.1100000000, 4.9000000000], [50.1100000000, 0.0000000000], [39.8900000000, 0.0000000000], [39.8900000000, 4.9000000000], [30.1100000000, 4.9000000000], [30.1100000000, 0.0000000000], [19.8900000000, 0.0000000000], [19.8900000000, 4.9000000000], [10.1100000000, 4.9000000000], [10.1100000000, 0.0000000000], [4.9000000000, 0.0000000000], [4.9000000000, 9.8900000000], [0.0000000000, 9.8900000000], [0.0000000000, 20.1100000000], [4.9000000000, 20.1100000000], [4.9000000000, 29.8900000000], [0.0000000000, 29.8900000000], [0.0000000000, 40.1100000000], [4.9000000000, 40.1100000000], [4.9000000000, 49.8900000000], [0.0000000000, 49.8900000000], [0.0000000000, 60.1100000000], [4.9000000000, 60.1100000000], [4.9000000000, 69.8900000000], [0.0000000000, 69.8900000000], [0.0000000000, 80.1100000000], [4.9000000000, 80.1100000000], [4.9000000000, 89.8900000000], [0.0000000000, 89.8900000000], [0.0000000000, 100.1100000000], [4.9000000000, 100.1100000000], [4.9000000000, 109.8900000000], [0.0000000000, 109.8900000000], [0.0000000000, 120.1100000000], [4.9000000000, 120.1100000000], [4.9000000000, 129.8900000000], [0.0000000000, 129.8900000000], [0.0000000000, 140.1100000000], [4.9000000000, 140.1100000000], [4.9000000000, 149.8900000000], [0.0000000000, 149.8900000000], [0.0000000000, 160.1100000000], [4.9000000000, 160.1100000000], [4.9000000000, 169.8900000000], [0.0000000000, 169.8900000000], [0.0000000000, 180.1100000000], [4.9000000000, 180.1100000000], [4.9000000000, 189.8900000000], [0.0000000000, 189.8900000000], [0.0000000000, 200.1100000000], [4.9000000000, 200.1100000000], [4.9000000000, 209.8900000000], [0.0000000000, 209.8900000000], [0.0000000000, 220.1100000000], [4.9000000000, 220.1100000000], [4.9000000000, 229.8900000000], [0.0000000000, 229.8900000000], [0.0000000000, 240.1100000000], [4.9000000000, 240.1100000000], [4.9000000000, 249.8900000000], [0.0000000000, 249.8900000000], [0.0000000000, 260.1100000000], [4.9000000000, 260.1100000000], [4.9000000000, 269.8900000000], [0.0000000000, 269.8900000000], [0.0000000000, 280.0000000000], [280.0000000000, 280.0000000000]]);
								}
							}
						}
					}
				}
			}
		}
	}
	union() {
		color(alpha = 1.0000000000, c = [0.7000000000, 0.4000000000, 0.1000000000]) {
			translate(v = [4.9000000000, 280, 0]) {
				rotate(a = 270, v = [0, 0, 1]) {
					rotate(a = 90, v = [1, 0, 0]) {
						linear_extrude(height = 4.9000000000) {
							union() {
								difference() {
									polygon(points = [[275.1000000000, 280.0000000000], [275.1000000000, 270.1100000000], [280.0000000000, 270.1100000000], [280.0000000000, 259.8900000000], [275.1000000000, 259.8900000000], [275.1000000000, 250.1100000000], [280.0000000000, 250.1100000000], [280.0000000000, 239.8900000000], [275.1000000000, 239.8900000000], [275.1000000000, 230.1100000000], [280.0000000000, 230.1100000000], [280.0000000000, 219.8900000000], [275.1000000000, 219.8900000000], [275.1000000000, 210.1100000000], [280.0000000000, 210.1100000000], [280.0000000000, 199.8900000000], [275.1000000000, 199.8900000000], [275.1000000000, 190.1100000000], [280.0000000000, 190.1100000000], [280.0000000000, 179.8900000000], [275.1000000000, 179.8900000000], [275.1000000000, 170.1100000000], [280.0000000000, 170.1100000000], [280.0000000000, 159.8900000000], [275.1000000000, 159.8900000000], [275.1000000000, 150.1100000000], [280.0000000000, 150.1100000000], [280.0000000000, 139.8900000000], [275.1000000000, 139.8900000000], [275.1000000000, 130.1100000000], [280.0000000000, 130.1100000000], [280.0000000000, 119.8900000000], [275.1000000000, 119.8900000000], [275.1000000000, 110.1100000000], [280.0000000000, 110.1100000000], [280.0000000000, 99.8900000000], [275.1000000000, 99.8900000000], [275.1000000000, 90.1100000000], [280.0000000000, 90.1100000000], [280.0000000000, 79.8900000000], [275.1000000000, 79.8900000000], [275.1000000000, 70.1100000000], [280.0000000000, 70.1100000000], [280.0000000000, 59.8900000000], [275.1000000000, 59.8900000000], [275.1000000000, 50.1100000000], [280.0000000000, 50.1100000000], [280.0000000000, 39.8900000000], [275.1000000000, 39.8900000000], [275.1000000000, 30.1100000000], [280.0000000000, 30.1100000000], [280.0000000000, 19.8900000000], [275.1000000000, 19.8900000000], [275.1000000000, 10.1100000000], [280.0000000000, 10.1100000000], [280.0000000000, 4.9000000000], [270.1100000000, 4.9000000000], [270.1100000000, 0.0000000000], [259.8900000000, 0.0000000000], [259.8900000000, 4.9000000000], [250.1100000000, 4.9000000000], [250.1100000000, 0.0000000000], [239.8900000000, 0.0000000000], [239.8900000000, 4.9000000000], [230.1100000000, 4.9000000000], [230.1100000000, 0.0000000000], [219.8900000000, 0.0000000000], [219.8900000000, 4.9000000000], [210.1100000000, 4.9000000000], [210.1100000000, 0.0000000000], [199.8900000000, 0.0000000000], [199.8900000000, 4.9000000000], [190.1100000000, 4.9000000000], [190.1100000000, 0.0000000000], [179.8900000000, 0.0000000000], [179.8900000000, 4.9000000000], [170.1100000000, 4.9000000000], [170.1100000000, 0.0000000000], [159.8900000000, 0.0000000000], [159.8900000000, 4.9000000000], [150.1100000000, 4.9000000000], [150.1100000000, 0.0000000000], [139.8900000000, 0.0000000000], [139.8900000000, 4.9000000000], [130.1100000000, 4.9000000000], [130.1100000000, 0.0000000000], [119.8900000000, 0.0000000000], [119.8900000000, 4.9000000000], [110.1100000000, 4.9000000000], [110.1100000000, 0.0000000000], [99.8900000000, 0.0000000000], [99.8900000000, 4.9000000000], [90.1100000000, 4.9000000000], [90.1100000000, 0.0000000000], [79.8900000000, 0.0000000000], [79.8900000000, 4.9000000000], [70.1100000000, 4.9000000000], [70.1100000000, 0.0000000000], [59.8900000000, 0.0000000000], [59.8900000000, 4.9000000000], [50.1100000000, 4.9000000000], [50.1100000000, 0.0000000000], [39.8900000000, 0.0000000000], [39.8900000000, 4.9000000000], [30.1100000000, 4.9000000000], [30.1100000000, 0.0000000000], [19.8900000000, 0.0000000000], [19.8900000000, 4.9000000000], [10.1100000000, 4.9000000000], [10.1100000000, 0.0000000000], [0.0000000000, 0.0000000000], [0.0000000000, 10.1100000000], [4.9000000000, 10.1100000000], [4.9000000000, 19.8900000000], [0.0000000000, 19.8900000000], [0.0000000000, 30.1100000000], [4.9000000000, 30.1100000000], [4.9000000000, 39.8900000000], [0.0000000000, 39.8900000000], [0.0000000000, 50.1100000000], [4.9000000000, 50.1100000000], [4.9000000000, 59.8900000000], [0.0000000000, 59.8900000000], [0.0000000000, 70.1100000000], [4.9000000000, 70.1100000000], [4.9000000000, 79.8900000000], [0.0000000000, 79.8900000000], [0.0000000000, 90.1100000000], [4.9000000000, 90.1100000000], [4.9000000000, 99.8900000000], [0.0000000000, 99.8900000000], [0.0000000000, 110.1100000000], [4.9000000000, 110.1100000000], [4.9000000000, 119.8900000000], [0.0000000000, 119.8900000000], [0.0000000000, 130.1100000000], [4.9000000000, 130.1100000000], [4.9000000000, 139.8900000000], [0.0000000000, 139.8900000000], [0.0000000000, 150.1100000000], [4.9000000000, 150.1100000000], [4.9000000000, 159.8900000000], [0.0000000000, 159.8900000000], [0.0000000000, 170.1100000000], [4.9000000000, 170.1100000000], [4.9000000000, 179.8900000000], [0.0000000000, 179.8900000000], [0.0000000000, 190.1100000000], [4.9000000000, 190.1100000000], [4.9000000000, 199.8900000000], [0.0000000000, 199.8900000000], [0.0000000000, 210.1100000000], [4.9000000000, 210.1100000000], [4.9000000000, 219.8900000000], [0.0000000000, 219.8900000000], [0.0000000000, 230.1100000000], [4.9000000000, 230.1100000000], [4.9000000000, 239.8900000000], [0.0000000000, 239.8900000000], [0.0000000000, 250.1100000000], [4.9000000000, 250.1100000000], [4.9000000000, 259.8900000000], [0.0000000000, 259.8900000000], [0.0000000000, 270.1100000000], [4.9000000000, 270.1100000000], [4.9000000000, 280.0000000000], [275.1000000000, 280.0000000000]]);
								}
							}
						}
					}
				}
			}
		}
	}
}
